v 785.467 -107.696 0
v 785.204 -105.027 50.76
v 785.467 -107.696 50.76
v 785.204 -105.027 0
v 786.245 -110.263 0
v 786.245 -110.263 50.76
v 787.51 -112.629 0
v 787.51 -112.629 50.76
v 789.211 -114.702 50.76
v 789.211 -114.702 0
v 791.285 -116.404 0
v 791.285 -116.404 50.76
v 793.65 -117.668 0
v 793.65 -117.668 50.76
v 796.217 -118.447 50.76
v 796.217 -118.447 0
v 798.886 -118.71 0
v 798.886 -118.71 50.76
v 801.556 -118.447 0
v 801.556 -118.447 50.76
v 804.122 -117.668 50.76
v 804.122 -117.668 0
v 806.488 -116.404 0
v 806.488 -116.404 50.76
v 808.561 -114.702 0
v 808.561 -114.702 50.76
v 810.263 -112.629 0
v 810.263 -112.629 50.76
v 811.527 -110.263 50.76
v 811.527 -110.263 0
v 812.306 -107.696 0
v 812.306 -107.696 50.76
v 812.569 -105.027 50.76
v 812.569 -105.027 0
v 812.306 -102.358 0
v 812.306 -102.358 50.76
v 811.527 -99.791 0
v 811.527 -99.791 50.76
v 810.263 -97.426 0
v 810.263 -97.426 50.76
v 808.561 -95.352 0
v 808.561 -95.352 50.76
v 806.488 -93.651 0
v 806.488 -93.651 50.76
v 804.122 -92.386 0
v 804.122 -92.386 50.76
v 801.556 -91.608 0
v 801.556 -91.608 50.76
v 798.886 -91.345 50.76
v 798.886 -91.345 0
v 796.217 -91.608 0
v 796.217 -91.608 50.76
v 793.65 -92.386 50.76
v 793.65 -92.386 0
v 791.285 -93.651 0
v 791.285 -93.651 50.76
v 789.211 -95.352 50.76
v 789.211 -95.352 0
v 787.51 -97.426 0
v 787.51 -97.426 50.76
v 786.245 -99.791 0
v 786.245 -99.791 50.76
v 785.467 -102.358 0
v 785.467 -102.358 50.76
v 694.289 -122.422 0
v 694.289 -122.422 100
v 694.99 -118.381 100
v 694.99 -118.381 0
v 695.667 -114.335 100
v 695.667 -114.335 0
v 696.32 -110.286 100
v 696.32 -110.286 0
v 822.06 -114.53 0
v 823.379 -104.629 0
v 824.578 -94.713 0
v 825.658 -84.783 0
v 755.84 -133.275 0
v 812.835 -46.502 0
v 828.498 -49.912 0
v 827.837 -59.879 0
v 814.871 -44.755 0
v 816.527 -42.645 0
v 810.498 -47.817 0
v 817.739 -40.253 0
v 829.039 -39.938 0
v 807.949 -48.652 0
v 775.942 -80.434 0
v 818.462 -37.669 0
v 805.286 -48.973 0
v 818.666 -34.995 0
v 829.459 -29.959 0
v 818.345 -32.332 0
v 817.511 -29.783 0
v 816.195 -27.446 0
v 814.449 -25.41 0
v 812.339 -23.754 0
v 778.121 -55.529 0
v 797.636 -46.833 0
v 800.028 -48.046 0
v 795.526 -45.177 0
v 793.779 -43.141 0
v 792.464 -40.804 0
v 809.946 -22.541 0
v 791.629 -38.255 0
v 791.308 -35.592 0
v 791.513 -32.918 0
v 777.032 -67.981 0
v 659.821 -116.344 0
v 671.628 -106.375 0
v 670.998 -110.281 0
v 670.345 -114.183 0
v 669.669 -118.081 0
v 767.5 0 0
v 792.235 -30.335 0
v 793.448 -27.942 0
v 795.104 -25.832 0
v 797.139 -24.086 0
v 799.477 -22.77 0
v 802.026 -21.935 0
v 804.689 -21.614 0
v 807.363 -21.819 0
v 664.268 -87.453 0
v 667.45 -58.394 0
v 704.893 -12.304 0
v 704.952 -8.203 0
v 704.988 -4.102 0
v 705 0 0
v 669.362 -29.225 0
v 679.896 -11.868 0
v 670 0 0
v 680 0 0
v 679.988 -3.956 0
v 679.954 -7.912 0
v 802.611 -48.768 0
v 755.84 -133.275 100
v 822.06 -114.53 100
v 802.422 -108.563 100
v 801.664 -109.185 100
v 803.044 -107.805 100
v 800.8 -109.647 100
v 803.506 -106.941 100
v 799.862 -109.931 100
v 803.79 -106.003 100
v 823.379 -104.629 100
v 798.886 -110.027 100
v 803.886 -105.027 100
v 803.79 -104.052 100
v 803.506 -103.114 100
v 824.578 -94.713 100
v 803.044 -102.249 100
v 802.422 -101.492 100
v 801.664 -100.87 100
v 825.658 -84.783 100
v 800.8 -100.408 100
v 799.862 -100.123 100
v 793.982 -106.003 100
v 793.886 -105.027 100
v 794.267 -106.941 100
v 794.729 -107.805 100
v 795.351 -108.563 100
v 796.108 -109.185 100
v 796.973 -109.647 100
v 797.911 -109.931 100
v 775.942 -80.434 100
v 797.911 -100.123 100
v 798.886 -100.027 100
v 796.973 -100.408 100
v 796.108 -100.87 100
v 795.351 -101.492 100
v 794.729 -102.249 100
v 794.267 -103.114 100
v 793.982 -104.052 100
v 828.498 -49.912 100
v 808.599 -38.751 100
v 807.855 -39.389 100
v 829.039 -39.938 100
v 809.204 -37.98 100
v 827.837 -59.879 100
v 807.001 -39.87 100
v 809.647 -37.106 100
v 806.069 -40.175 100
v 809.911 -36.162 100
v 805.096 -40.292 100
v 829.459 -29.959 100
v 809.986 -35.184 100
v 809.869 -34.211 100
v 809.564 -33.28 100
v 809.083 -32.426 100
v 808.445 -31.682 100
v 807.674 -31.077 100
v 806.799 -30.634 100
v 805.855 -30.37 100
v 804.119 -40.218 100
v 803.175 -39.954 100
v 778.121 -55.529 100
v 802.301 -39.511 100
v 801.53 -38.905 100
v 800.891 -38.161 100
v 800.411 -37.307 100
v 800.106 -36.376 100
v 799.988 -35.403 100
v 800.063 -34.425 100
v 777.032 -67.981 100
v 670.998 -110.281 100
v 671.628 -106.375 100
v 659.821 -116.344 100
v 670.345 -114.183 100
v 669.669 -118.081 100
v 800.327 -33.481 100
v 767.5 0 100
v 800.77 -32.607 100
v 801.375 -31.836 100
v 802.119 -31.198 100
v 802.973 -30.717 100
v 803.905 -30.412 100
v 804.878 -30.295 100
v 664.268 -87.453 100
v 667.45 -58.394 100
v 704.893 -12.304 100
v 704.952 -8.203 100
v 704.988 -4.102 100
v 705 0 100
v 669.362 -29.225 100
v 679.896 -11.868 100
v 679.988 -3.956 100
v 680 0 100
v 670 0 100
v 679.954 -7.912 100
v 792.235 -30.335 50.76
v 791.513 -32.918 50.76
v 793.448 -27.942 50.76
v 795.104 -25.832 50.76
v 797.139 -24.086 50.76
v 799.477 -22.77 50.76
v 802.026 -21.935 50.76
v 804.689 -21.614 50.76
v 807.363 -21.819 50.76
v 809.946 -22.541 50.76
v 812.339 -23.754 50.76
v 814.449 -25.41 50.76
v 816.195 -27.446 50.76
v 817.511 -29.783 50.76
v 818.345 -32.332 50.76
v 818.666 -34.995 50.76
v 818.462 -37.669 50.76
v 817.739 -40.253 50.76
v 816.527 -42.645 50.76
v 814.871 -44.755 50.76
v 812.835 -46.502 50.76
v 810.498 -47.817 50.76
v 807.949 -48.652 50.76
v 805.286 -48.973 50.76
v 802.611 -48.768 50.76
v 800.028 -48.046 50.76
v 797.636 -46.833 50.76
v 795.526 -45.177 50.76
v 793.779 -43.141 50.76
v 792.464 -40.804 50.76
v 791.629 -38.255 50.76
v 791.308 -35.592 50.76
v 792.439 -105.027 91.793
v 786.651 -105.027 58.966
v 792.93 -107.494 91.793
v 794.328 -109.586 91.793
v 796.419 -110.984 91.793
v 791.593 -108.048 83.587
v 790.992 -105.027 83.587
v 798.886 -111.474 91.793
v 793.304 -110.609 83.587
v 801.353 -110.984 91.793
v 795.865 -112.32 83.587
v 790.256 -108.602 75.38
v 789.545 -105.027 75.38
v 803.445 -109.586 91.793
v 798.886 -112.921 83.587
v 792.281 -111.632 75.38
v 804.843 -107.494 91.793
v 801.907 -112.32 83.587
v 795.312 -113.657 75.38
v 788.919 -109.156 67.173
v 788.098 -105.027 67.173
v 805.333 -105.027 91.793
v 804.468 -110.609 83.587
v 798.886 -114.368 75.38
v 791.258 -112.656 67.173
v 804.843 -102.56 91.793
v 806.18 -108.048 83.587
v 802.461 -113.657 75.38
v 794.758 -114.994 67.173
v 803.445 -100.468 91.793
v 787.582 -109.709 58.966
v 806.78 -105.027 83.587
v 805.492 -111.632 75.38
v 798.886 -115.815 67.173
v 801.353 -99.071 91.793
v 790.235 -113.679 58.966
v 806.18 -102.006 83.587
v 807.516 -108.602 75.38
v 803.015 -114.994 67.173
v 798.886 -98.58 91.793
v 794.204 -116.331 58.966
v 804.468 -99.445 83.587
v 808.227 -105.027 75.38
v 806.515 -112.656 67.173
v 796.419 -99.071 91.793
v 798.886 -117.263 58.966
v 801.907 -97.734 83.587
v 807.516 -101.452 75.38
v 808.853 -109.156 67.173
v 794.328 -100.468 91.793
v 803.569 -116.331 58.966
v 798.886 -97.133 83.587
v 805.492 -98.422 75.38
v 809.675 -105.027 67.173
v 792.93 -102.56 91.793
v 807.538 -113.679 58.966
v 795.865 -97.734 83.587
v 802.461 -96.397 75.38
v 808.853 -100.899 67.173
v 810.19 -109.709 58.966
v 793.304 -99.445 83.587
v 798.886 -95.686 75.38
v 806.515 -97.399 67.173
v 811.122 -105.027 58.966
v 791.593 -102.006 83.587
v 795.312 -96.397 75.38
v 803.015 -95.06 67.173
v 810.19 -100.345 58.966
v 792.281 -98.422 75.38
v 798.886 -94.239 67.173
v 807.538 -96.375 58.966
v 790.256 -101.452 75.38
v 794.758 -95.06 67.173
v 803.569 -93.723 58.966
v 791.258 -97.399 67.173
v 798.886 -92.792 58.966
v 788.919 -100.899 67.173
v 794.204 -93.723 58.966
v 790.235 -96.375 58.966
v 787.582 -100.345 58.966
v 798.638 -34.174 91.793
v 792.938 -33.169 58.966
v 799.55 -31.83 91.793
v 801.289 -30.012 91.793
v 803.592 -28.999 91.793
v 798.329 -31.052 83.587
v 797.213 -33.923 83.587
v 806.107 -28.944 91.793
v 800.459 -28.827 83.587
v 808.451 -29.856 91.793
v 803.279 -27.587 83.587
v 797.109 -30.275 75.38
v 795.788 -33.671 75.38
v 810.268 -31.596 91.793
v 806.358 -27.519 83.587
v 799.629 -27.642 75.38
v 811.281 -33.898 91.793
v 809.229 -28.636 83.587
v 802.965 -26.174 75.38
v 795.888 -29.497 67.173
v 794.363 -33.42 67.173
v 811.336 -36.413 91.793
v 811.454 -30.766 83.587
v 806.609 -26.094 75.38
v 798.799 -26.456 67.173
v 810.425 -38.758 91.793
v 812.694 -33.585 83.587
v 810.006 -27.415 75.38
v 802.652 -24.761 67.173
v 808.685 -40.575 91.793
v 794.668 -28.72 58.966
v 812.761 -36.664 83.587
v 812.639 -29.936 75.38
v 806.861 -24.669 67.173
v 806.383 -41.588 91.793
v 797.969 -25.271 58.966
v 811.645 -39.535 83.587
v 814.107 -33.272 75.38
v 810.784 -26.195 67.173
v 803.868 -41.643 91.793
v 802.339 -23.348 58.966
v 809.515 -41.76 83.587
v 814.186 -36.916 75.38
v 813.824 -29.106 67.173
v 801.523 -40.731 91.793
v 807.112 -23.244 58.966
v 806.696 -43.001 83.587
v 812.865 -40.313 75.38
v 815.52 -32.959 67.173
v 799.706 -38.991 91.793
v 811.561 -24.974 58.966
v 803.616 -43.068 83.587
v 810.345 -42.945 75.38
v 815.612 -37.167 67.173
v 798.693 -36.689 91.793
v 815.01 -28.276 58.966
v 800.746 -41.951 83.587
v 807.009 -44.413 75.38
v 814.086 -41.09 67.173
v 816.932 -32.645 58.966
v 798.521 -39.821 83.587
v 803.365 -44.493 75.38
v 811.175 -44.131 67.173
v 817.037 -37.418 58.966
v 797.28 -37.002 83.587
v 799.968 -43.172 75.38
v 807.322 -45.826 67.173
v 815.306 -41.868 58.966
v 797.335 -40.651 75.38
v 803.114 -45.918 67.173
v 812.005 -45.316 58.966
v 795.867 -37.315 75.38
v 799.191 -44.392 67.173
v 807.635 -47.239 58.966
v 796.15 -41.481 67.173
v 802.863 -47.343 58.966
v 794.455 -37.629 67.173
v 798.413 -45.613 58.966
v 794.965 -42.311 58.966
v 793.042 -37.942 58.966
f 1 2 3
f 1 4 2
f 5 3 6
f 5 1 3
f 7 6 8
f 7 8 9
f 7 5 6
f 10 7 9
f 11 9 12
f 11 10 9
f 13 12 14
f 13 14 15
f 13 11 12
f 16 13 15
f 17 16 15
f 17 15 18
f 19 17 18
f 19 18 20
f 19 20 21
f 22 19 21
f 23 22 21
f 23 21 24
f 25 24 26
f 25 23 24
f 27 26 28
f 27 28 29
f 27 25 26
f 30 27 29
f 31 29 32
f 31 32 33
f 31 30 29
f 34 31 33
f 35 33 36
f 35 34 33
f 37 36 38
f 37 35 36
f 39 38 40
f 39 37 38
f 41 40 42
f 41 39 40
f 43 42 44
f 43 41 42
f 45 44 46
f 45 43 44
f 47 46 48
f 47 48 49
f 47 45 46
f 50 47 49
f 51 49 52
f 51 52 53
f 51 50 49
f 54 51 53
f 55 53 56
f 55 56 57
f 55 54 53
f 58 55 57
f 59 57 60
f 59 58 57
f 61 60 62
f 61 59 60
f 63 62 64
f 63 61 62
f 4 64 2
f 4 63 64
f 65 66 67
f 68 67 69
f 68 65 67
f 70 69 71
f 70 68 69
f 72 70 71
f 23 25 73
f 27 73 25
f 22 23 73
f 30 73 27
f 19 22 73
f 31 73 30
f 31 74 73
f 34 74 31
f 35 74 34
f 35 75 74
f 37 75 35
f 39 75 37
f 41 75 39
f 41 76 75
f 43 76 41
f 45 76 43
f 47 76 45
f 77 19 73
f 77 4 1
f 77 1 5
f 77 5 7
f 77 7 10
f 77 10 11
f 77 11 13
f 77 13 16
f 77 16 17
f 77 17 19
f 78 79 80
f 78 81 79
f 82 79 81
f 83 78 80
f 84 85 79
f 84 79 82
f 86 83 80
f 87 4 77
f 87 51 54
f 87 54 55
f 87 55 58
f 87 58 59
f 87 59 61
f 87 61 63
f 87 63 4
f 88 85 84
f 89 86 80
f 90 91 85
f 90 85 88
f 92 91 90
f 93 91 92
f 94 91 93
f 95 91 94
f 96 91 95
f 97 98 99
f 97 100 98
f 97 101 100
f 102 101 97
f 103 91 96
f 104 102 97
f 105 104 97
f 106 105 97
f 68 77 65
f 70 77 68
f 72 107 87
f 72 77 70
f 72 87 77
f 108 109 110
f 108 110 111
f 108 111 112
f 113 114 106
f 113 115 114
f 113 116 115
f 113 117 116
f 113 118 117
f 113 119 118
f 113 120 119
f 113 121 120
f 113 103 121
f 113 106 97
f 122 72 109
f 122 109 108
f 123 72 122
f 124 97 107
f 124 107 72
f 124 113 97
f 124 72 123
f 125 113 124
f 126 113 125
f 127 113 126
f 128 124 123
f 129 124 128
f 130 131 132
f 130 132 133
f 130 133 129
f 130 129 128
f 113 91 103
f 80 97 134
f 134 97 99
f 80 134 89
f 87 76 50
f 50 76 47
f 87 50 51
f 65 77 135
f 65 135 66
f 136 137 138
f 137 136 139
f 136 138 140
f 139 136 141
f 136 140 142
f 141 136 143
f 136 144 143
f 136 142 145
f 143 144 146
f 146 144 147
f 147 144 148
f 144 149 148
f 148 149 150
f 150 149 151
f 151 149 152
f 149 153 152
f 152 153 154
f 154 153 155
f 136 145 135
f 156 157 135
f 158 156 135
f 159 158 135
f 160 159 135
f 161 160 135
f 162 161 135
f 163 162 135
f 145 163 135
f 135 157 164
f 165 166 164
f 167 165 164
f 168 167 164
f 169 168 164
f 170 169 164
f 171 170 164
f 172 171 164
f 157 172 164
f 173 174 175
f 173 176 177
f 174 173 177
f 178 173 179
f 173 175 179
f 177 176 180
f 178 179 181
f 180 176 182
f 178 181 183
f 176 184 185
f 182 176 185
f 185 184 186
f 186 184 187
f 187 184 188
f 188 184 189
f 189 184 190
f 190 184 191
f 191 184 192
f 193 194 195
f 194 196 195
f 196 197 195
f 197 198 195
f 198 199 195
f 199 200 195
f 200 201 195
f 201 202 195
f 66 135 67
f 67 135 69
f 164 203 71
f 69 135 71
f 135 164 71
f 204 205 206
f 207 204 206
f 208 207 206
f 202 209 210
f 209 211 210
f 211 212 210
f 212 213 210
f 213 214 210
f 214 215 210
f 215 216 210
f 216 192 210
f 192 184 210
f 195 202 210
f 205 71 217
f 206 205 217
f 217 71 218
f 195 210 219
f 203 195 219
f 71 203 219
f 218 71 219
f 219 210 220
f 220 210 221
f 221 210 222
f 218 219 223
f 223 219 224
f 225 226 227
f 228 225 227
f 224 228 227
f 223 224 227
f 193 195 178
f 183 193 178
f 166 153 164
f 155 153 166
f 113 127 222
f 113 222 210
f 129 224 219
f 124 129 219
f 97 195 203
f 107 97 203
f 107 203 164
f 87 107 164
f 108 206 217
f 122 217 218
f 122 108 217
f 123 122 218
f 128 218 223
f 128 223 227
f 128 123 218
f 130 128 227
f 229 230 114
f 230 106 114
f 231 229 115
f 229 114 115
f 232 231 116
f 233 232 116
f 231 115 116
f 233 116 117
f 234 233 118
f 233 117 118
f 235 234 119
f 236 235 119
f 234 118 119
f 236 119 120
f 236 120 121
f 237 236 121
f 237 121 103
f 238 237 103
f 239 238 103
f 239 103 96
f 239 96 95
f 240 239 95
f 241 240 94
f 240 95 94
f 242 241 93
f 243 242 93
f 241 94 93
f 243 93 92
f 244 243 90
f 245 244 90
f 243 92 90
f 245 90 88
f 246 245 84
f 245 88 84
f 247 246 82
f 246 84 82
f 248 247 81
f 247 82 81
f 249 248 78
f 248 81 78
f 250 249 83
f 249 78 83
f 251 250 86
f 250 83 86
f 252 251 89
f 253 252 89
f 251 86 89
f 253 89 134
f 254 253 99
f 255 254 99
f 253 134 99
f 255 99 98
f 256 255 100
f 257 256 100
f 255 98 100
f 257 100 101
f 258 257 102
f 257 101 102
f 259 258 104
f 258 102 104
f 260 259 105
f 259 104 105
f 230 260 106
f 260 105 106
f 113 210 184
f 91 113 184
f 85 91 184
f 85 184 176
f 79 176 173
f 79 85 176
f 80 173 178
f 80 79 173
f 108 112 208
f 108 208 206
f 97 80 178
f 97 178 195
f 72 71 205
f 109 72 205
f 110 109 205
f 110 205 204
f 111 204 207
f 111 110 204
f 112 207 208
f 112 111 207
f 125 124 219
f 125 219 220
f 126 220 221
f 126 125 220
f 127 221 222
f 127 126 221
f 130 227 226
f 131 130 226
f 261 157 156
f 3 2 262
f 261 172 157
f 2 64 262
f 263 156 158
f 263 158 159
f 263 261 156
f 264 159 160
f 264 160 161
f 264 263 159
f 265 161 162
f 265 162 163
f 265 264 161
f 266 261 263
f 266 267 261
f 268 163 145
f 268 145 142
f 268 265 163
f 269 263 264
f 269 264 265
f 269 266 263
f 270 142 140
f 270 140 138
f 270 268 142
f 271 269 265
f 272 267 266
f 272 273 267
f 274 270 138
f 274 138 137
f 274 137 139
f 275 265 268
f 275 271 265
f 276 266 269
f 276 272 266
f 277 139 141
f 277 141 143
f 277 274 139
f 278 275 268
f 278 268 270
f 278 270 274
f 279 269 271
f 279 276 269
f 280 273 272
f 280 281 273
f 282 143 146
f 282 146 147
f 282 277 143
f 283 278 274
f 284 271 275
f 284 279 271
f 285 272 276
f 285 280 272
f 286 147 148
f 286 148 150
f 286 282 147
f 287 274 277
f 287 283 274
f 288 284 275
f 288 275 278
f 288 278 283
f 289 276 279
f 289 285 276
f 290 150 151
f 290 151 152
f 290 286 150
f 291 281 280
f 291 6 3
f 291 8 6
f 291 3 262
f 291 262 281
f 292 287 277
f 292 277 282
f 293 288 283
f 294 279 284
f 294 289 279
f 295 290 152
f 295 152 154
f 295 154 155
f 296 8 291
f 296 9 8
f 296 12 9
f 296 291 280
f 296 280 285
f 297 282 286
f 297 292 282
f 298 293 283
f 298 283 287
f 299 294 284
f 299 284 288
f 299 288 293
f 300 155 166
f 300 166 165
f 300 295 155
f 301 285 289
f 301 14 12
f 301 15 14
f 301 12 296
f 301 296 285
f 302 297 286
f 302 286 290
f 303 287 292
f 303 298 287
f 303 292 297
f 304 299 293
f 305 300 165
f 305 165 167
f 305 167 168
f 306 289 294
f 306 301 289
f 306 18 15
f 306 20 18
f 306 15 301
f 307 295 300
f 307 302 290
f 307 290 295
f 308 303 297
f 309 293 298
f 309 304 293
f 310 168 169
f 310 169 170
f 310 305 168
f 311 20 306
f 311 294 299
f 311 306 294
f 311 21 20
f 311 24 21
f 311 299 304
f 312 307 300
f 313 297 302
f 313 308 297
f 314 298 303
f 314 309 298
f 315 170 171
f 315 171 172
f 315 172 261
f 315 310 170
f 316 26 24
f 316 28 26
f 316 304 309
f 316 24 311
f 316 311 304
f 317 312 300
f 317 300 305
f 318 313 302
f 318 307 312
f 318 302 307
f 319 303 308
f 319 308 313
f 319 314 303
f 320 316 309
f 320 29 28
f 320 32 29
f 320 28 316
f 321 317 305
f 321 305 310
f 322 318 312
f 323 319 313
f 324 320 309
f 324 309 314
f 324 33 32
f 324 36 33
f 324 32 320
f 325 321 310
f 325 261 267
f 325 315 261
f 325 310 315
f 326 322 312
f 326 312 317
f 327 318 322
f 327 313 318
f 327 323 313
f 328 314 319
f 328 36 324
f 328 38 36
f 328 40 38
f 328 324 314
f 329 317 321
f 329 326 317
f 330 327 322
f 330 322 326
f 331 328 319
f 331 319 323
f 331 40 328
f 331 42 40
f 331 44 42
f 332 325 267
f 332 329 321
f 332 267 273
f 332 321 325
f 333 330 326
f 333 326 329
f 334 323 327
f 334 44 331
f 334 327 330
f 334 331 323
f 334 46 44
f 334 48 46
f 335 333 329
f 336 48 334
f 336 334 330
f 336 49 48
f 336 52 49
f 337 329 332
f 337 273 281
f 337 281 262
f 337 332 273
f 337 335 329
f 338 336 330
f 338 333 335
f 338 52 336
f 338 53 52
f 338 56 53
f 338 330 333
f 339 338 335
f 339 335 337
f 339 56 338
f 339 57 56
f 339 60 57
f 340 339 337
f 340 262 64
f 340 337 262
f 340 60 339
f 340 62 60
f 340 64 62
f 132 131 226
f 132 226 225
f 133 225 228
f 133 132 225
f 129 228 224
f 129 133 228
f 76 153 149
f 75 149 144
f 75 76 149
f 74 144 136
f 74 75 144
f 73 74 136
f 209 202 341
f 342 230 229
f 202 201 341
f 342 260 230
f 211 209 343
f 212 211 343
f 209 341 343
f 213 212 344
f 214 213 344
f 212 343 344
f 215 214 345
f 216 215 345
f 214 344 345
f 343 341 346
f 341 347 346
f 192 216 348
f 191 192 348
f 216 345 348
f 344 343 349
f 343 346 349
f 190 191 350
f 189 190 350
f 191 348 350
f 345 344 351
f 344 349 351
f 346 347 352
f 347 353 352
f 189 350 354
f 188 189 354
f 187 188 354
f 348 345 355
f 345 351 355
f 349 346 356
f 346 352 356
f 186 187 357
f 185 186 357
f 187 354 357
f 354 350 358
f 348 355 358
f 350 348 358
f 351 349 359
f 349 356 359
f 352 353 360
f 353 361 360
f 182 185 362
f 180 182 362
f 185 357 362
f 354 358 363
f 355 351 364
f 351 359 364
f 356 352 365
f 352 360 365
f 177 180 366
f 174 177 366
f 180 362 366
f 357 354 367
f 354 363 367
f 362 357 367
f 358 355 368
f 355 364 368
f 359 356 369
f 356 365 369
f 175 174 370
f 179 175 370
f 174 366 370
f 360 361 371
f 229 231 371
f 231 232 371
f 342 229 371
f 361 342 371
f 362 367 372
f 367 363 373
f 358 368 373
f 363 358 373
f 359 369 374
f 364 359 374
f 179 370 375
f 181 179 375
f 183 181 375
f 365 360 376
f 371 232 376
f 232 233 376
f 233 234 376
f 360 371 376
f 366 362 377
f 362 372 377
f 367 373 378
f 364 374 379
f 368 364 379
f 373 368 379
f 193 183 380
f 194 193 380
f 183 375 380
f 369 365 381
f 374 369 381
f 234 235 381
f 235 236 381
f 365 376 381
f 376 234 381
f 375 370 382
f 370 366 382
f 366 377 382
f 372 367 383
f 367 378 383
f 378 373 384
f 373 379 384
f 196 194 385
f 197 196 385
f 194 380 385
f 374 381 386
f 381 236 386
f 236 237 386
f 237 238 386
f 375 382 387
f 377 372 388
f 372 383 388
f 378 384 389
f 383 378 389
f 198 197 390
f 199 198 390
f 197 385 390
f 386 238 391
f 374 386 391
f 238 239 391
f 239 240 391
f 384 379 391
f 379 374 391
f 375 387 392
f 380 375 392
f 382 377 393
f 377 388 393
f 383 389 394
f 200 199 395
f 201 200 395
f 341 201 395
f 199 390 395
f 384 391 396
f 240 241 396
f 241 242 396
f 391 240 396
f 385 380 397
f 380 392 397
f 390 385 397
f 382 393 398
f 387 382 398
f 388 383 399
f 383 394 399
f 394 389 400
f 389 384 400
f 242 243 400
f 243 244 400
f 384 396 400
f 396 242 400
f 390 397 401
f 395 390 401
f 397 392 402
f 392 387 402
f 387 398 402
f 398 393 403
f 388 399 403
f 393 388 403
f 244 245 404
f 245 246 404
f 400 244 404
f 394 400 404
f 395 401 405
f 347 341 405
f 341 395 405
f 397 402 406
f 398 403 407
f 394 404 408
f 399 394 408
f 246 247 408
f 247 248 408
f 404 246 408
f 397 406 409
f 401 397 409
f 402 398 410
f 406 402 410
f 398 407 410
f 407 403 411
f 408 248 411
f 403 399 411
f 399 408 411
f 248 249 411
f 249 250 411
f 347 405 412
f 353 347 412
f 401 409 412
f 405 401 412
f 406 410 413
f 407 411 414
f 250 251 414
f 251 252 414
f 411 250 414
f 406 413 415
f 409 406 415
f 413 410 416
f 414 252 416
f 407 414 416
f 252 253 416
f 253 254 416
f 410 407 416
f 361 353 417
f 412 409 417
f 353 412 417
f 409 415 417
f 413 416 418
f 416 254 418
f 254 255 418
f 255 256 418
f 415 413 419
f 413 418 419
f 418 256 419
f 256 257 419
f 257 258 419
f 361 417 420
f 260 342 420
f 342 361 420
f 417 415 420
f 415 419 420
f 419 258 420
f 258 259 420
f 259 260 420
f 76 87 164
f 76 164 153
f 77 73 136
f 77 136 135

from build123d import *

# Parameters (mm, degrees)
EXTRUDE_1_DEPTH     = 100
CUT_EXTRUDE_1_DEPTH = 849.335356313
CUT_EXTRUDE_2_DEPTH = 849.335356313
CUT_EXTRUDE_3_REACH = 850.335


with BuildPart() as part:
    # 草图1 → 凸台-拉伸1 (new body)
    with BuildSketch(Plane.XY):
        with BuildLine():
            Line((670, 0), (830, 0))
            ThreePointArc((830, 0), (826.841599416, -72.339266481), (817.390435, -144.127987464))
            Line((817.390435, -144.127987464), (659.821194518, -116.344279037))
            ThreePointArc((659.821194518, -116.344279037), (667.450447721, -58.394347641), (670, 0))
        make_face()
    extrude(amount=EXTRUDE_1_DEPTH)

    # 草图3 → 切除-拉伸1 (cut, through all)
    with BuildSketch(Plane.XY.offset(100)):
        with BuildLine():
            Line((778.121311296, -55.529045617), (777.031864512, -67.981479343))
            Line((777.031864512, -67.981479343), (775.942417727, -80.433913069))
            Line((775.942417727, -80.433913069), (825.658378988, -84.783496076))
            ThreePointArc((825.658378988, -84.783496076), (826.841599416, -72.339266481), (827.837272557, -59.878628624))
            Line((827.837272557, -59.878628624), (778.121311296, -55.529045617))
        make_face()
    extrude(amount=-CUT_EXTRUDE_1_DEPTH, mode=Mode.SUBTRACT)

    # 草图5 → 切除-旋转1 (revolve, cut)
    with BuildSketch(Plane(origin=(-3.050450996, -34.866814433, 0), x_dir=(-0.9961946980917455, 0.08715574274765771, 0), z_dir=(-0.08715574274765771, -0.9961946980917455, 0)), mode=Mode.PRIVATE) as cut_revolve_1_sk:
        Polygon((-805, -100), (-810, -100), (-818.682408883, -50.759612349), (-818.682408883, 0), (-805, 0), align=None)
    cut_revolve_1 = revolve(cut_revolve_1_sk.sketch.rotate(Axis((798.886280968, -105.027187345, 0), (0, 0, 1)), 185), axis=Axis((798.886280968, -105.027187345, 0), (0, 0, 1)), mode=Mode.SUBTRACT)

    # 镜向1: 切除-旋转1 across plane
    add(cut_revolve_1.mirror(Plane(origin=(0, 0, 0), x_dir=(0, 0, 1), z_dir=(-0.08715574274765854, -0.9961946980917457, 0))), mode=Mode.SUBTRACT)

    # 草图6 → 切除-拉伸2 (cut, through all)
    with BuildSketch(Plane(origin=(0, 0, 0), x_dir=(-1, 0, 0), z_dir=(0, 0, -1))):
        with BuildLine():
            Line((-669.669272048, -118.080760814), (-694.289465874, -122.421965255))
            ThreePointArc((-694.289465874, -122.421965255), (-695.331349084, -116.358562132), (-696.32028012, -110.286297853))
            Line((-696.32028012, -110.286297853), (-671.628071605, -106.375436227))
            ThreePointArc((-671.628071605, -106.375436227), (-670.674209045, -112.232371985), (-669.669272048, -118.080760814))
        make_face()
        with BuildLine():
            Line((-679.896432706, -11.867636377), (-704.892625085, -12.303946538))
            ThreePointArc((-704.892625085, -12.303946538), (-704.97315576, -6.152207526), (-705, 0))
            Line((-705, 0), (-680, 0))
            ThreePointArc((-680, 0), (-679.974107684, -5.934044139), (-679.896432706, -11.867636377))
        make_face()
    extrude(amount=-CUT_EXTRUDE_2_DEPTH, mode=Mode.SUBTRACT)

    # 草图7 → 切除-拉伸3 (cut, up to next)
    with BuildSketch(Plane.XY.offset(100), mode=Mode.PRIVATE) as cut_extrude_3_sk1:
        with BuildLine():
            Line((767.5, 0), (829.459141918, -29.958836576))
            ThreePointArc((829.459141918, -29.958836576), (829.864774464, -14.981859167), (830, 0))
            Line((830, 0), (767.5, 0))
        make_face()
    cut_extrude_3_tool1 = extrude(cut_extrude_3_sk1.sketch, amount=-CUT_EXTRUDE_3_REACH, mode=Mode.PRIVATE) & part.part
    # 草图7 → 切除-拉伸3 (cut, up to next)
    with BuildSketch(Plane.XY.offset(100), mode=Mode.PRIVATE) as cut_extrude_3_sk2:
        with BuildLine():
            Line((822.060091144, -114.530373912), (755.839950437, -133.274976359))
            Line((755.839950437, -133.274976359), (817.390435, -144.127987464))
            ThreePointArc((817.390435, -144.127987464), (819.858836386, -129.350254733), (822.060091144, -114.530373912))
        make_face()
    cut_extrude_3_tool2 = extrude(cut_extrude_3_sk2.sketch, amount=-CUT_EXTRUDE_3_REACH, mode=Mode.PRIVATE) & part.part
    add(cut_extrude_3_tool1.solids().sort_by_distance((809.046215, -10.000647, 100))[0], mode=Mode.SUBTRACT)
    add(cut_extrude_3_tool2.solids().sort_by_distance((798.491579, -130.640686, 100))[0], mode=Mode.SUBTRACT)


solid = part.part
